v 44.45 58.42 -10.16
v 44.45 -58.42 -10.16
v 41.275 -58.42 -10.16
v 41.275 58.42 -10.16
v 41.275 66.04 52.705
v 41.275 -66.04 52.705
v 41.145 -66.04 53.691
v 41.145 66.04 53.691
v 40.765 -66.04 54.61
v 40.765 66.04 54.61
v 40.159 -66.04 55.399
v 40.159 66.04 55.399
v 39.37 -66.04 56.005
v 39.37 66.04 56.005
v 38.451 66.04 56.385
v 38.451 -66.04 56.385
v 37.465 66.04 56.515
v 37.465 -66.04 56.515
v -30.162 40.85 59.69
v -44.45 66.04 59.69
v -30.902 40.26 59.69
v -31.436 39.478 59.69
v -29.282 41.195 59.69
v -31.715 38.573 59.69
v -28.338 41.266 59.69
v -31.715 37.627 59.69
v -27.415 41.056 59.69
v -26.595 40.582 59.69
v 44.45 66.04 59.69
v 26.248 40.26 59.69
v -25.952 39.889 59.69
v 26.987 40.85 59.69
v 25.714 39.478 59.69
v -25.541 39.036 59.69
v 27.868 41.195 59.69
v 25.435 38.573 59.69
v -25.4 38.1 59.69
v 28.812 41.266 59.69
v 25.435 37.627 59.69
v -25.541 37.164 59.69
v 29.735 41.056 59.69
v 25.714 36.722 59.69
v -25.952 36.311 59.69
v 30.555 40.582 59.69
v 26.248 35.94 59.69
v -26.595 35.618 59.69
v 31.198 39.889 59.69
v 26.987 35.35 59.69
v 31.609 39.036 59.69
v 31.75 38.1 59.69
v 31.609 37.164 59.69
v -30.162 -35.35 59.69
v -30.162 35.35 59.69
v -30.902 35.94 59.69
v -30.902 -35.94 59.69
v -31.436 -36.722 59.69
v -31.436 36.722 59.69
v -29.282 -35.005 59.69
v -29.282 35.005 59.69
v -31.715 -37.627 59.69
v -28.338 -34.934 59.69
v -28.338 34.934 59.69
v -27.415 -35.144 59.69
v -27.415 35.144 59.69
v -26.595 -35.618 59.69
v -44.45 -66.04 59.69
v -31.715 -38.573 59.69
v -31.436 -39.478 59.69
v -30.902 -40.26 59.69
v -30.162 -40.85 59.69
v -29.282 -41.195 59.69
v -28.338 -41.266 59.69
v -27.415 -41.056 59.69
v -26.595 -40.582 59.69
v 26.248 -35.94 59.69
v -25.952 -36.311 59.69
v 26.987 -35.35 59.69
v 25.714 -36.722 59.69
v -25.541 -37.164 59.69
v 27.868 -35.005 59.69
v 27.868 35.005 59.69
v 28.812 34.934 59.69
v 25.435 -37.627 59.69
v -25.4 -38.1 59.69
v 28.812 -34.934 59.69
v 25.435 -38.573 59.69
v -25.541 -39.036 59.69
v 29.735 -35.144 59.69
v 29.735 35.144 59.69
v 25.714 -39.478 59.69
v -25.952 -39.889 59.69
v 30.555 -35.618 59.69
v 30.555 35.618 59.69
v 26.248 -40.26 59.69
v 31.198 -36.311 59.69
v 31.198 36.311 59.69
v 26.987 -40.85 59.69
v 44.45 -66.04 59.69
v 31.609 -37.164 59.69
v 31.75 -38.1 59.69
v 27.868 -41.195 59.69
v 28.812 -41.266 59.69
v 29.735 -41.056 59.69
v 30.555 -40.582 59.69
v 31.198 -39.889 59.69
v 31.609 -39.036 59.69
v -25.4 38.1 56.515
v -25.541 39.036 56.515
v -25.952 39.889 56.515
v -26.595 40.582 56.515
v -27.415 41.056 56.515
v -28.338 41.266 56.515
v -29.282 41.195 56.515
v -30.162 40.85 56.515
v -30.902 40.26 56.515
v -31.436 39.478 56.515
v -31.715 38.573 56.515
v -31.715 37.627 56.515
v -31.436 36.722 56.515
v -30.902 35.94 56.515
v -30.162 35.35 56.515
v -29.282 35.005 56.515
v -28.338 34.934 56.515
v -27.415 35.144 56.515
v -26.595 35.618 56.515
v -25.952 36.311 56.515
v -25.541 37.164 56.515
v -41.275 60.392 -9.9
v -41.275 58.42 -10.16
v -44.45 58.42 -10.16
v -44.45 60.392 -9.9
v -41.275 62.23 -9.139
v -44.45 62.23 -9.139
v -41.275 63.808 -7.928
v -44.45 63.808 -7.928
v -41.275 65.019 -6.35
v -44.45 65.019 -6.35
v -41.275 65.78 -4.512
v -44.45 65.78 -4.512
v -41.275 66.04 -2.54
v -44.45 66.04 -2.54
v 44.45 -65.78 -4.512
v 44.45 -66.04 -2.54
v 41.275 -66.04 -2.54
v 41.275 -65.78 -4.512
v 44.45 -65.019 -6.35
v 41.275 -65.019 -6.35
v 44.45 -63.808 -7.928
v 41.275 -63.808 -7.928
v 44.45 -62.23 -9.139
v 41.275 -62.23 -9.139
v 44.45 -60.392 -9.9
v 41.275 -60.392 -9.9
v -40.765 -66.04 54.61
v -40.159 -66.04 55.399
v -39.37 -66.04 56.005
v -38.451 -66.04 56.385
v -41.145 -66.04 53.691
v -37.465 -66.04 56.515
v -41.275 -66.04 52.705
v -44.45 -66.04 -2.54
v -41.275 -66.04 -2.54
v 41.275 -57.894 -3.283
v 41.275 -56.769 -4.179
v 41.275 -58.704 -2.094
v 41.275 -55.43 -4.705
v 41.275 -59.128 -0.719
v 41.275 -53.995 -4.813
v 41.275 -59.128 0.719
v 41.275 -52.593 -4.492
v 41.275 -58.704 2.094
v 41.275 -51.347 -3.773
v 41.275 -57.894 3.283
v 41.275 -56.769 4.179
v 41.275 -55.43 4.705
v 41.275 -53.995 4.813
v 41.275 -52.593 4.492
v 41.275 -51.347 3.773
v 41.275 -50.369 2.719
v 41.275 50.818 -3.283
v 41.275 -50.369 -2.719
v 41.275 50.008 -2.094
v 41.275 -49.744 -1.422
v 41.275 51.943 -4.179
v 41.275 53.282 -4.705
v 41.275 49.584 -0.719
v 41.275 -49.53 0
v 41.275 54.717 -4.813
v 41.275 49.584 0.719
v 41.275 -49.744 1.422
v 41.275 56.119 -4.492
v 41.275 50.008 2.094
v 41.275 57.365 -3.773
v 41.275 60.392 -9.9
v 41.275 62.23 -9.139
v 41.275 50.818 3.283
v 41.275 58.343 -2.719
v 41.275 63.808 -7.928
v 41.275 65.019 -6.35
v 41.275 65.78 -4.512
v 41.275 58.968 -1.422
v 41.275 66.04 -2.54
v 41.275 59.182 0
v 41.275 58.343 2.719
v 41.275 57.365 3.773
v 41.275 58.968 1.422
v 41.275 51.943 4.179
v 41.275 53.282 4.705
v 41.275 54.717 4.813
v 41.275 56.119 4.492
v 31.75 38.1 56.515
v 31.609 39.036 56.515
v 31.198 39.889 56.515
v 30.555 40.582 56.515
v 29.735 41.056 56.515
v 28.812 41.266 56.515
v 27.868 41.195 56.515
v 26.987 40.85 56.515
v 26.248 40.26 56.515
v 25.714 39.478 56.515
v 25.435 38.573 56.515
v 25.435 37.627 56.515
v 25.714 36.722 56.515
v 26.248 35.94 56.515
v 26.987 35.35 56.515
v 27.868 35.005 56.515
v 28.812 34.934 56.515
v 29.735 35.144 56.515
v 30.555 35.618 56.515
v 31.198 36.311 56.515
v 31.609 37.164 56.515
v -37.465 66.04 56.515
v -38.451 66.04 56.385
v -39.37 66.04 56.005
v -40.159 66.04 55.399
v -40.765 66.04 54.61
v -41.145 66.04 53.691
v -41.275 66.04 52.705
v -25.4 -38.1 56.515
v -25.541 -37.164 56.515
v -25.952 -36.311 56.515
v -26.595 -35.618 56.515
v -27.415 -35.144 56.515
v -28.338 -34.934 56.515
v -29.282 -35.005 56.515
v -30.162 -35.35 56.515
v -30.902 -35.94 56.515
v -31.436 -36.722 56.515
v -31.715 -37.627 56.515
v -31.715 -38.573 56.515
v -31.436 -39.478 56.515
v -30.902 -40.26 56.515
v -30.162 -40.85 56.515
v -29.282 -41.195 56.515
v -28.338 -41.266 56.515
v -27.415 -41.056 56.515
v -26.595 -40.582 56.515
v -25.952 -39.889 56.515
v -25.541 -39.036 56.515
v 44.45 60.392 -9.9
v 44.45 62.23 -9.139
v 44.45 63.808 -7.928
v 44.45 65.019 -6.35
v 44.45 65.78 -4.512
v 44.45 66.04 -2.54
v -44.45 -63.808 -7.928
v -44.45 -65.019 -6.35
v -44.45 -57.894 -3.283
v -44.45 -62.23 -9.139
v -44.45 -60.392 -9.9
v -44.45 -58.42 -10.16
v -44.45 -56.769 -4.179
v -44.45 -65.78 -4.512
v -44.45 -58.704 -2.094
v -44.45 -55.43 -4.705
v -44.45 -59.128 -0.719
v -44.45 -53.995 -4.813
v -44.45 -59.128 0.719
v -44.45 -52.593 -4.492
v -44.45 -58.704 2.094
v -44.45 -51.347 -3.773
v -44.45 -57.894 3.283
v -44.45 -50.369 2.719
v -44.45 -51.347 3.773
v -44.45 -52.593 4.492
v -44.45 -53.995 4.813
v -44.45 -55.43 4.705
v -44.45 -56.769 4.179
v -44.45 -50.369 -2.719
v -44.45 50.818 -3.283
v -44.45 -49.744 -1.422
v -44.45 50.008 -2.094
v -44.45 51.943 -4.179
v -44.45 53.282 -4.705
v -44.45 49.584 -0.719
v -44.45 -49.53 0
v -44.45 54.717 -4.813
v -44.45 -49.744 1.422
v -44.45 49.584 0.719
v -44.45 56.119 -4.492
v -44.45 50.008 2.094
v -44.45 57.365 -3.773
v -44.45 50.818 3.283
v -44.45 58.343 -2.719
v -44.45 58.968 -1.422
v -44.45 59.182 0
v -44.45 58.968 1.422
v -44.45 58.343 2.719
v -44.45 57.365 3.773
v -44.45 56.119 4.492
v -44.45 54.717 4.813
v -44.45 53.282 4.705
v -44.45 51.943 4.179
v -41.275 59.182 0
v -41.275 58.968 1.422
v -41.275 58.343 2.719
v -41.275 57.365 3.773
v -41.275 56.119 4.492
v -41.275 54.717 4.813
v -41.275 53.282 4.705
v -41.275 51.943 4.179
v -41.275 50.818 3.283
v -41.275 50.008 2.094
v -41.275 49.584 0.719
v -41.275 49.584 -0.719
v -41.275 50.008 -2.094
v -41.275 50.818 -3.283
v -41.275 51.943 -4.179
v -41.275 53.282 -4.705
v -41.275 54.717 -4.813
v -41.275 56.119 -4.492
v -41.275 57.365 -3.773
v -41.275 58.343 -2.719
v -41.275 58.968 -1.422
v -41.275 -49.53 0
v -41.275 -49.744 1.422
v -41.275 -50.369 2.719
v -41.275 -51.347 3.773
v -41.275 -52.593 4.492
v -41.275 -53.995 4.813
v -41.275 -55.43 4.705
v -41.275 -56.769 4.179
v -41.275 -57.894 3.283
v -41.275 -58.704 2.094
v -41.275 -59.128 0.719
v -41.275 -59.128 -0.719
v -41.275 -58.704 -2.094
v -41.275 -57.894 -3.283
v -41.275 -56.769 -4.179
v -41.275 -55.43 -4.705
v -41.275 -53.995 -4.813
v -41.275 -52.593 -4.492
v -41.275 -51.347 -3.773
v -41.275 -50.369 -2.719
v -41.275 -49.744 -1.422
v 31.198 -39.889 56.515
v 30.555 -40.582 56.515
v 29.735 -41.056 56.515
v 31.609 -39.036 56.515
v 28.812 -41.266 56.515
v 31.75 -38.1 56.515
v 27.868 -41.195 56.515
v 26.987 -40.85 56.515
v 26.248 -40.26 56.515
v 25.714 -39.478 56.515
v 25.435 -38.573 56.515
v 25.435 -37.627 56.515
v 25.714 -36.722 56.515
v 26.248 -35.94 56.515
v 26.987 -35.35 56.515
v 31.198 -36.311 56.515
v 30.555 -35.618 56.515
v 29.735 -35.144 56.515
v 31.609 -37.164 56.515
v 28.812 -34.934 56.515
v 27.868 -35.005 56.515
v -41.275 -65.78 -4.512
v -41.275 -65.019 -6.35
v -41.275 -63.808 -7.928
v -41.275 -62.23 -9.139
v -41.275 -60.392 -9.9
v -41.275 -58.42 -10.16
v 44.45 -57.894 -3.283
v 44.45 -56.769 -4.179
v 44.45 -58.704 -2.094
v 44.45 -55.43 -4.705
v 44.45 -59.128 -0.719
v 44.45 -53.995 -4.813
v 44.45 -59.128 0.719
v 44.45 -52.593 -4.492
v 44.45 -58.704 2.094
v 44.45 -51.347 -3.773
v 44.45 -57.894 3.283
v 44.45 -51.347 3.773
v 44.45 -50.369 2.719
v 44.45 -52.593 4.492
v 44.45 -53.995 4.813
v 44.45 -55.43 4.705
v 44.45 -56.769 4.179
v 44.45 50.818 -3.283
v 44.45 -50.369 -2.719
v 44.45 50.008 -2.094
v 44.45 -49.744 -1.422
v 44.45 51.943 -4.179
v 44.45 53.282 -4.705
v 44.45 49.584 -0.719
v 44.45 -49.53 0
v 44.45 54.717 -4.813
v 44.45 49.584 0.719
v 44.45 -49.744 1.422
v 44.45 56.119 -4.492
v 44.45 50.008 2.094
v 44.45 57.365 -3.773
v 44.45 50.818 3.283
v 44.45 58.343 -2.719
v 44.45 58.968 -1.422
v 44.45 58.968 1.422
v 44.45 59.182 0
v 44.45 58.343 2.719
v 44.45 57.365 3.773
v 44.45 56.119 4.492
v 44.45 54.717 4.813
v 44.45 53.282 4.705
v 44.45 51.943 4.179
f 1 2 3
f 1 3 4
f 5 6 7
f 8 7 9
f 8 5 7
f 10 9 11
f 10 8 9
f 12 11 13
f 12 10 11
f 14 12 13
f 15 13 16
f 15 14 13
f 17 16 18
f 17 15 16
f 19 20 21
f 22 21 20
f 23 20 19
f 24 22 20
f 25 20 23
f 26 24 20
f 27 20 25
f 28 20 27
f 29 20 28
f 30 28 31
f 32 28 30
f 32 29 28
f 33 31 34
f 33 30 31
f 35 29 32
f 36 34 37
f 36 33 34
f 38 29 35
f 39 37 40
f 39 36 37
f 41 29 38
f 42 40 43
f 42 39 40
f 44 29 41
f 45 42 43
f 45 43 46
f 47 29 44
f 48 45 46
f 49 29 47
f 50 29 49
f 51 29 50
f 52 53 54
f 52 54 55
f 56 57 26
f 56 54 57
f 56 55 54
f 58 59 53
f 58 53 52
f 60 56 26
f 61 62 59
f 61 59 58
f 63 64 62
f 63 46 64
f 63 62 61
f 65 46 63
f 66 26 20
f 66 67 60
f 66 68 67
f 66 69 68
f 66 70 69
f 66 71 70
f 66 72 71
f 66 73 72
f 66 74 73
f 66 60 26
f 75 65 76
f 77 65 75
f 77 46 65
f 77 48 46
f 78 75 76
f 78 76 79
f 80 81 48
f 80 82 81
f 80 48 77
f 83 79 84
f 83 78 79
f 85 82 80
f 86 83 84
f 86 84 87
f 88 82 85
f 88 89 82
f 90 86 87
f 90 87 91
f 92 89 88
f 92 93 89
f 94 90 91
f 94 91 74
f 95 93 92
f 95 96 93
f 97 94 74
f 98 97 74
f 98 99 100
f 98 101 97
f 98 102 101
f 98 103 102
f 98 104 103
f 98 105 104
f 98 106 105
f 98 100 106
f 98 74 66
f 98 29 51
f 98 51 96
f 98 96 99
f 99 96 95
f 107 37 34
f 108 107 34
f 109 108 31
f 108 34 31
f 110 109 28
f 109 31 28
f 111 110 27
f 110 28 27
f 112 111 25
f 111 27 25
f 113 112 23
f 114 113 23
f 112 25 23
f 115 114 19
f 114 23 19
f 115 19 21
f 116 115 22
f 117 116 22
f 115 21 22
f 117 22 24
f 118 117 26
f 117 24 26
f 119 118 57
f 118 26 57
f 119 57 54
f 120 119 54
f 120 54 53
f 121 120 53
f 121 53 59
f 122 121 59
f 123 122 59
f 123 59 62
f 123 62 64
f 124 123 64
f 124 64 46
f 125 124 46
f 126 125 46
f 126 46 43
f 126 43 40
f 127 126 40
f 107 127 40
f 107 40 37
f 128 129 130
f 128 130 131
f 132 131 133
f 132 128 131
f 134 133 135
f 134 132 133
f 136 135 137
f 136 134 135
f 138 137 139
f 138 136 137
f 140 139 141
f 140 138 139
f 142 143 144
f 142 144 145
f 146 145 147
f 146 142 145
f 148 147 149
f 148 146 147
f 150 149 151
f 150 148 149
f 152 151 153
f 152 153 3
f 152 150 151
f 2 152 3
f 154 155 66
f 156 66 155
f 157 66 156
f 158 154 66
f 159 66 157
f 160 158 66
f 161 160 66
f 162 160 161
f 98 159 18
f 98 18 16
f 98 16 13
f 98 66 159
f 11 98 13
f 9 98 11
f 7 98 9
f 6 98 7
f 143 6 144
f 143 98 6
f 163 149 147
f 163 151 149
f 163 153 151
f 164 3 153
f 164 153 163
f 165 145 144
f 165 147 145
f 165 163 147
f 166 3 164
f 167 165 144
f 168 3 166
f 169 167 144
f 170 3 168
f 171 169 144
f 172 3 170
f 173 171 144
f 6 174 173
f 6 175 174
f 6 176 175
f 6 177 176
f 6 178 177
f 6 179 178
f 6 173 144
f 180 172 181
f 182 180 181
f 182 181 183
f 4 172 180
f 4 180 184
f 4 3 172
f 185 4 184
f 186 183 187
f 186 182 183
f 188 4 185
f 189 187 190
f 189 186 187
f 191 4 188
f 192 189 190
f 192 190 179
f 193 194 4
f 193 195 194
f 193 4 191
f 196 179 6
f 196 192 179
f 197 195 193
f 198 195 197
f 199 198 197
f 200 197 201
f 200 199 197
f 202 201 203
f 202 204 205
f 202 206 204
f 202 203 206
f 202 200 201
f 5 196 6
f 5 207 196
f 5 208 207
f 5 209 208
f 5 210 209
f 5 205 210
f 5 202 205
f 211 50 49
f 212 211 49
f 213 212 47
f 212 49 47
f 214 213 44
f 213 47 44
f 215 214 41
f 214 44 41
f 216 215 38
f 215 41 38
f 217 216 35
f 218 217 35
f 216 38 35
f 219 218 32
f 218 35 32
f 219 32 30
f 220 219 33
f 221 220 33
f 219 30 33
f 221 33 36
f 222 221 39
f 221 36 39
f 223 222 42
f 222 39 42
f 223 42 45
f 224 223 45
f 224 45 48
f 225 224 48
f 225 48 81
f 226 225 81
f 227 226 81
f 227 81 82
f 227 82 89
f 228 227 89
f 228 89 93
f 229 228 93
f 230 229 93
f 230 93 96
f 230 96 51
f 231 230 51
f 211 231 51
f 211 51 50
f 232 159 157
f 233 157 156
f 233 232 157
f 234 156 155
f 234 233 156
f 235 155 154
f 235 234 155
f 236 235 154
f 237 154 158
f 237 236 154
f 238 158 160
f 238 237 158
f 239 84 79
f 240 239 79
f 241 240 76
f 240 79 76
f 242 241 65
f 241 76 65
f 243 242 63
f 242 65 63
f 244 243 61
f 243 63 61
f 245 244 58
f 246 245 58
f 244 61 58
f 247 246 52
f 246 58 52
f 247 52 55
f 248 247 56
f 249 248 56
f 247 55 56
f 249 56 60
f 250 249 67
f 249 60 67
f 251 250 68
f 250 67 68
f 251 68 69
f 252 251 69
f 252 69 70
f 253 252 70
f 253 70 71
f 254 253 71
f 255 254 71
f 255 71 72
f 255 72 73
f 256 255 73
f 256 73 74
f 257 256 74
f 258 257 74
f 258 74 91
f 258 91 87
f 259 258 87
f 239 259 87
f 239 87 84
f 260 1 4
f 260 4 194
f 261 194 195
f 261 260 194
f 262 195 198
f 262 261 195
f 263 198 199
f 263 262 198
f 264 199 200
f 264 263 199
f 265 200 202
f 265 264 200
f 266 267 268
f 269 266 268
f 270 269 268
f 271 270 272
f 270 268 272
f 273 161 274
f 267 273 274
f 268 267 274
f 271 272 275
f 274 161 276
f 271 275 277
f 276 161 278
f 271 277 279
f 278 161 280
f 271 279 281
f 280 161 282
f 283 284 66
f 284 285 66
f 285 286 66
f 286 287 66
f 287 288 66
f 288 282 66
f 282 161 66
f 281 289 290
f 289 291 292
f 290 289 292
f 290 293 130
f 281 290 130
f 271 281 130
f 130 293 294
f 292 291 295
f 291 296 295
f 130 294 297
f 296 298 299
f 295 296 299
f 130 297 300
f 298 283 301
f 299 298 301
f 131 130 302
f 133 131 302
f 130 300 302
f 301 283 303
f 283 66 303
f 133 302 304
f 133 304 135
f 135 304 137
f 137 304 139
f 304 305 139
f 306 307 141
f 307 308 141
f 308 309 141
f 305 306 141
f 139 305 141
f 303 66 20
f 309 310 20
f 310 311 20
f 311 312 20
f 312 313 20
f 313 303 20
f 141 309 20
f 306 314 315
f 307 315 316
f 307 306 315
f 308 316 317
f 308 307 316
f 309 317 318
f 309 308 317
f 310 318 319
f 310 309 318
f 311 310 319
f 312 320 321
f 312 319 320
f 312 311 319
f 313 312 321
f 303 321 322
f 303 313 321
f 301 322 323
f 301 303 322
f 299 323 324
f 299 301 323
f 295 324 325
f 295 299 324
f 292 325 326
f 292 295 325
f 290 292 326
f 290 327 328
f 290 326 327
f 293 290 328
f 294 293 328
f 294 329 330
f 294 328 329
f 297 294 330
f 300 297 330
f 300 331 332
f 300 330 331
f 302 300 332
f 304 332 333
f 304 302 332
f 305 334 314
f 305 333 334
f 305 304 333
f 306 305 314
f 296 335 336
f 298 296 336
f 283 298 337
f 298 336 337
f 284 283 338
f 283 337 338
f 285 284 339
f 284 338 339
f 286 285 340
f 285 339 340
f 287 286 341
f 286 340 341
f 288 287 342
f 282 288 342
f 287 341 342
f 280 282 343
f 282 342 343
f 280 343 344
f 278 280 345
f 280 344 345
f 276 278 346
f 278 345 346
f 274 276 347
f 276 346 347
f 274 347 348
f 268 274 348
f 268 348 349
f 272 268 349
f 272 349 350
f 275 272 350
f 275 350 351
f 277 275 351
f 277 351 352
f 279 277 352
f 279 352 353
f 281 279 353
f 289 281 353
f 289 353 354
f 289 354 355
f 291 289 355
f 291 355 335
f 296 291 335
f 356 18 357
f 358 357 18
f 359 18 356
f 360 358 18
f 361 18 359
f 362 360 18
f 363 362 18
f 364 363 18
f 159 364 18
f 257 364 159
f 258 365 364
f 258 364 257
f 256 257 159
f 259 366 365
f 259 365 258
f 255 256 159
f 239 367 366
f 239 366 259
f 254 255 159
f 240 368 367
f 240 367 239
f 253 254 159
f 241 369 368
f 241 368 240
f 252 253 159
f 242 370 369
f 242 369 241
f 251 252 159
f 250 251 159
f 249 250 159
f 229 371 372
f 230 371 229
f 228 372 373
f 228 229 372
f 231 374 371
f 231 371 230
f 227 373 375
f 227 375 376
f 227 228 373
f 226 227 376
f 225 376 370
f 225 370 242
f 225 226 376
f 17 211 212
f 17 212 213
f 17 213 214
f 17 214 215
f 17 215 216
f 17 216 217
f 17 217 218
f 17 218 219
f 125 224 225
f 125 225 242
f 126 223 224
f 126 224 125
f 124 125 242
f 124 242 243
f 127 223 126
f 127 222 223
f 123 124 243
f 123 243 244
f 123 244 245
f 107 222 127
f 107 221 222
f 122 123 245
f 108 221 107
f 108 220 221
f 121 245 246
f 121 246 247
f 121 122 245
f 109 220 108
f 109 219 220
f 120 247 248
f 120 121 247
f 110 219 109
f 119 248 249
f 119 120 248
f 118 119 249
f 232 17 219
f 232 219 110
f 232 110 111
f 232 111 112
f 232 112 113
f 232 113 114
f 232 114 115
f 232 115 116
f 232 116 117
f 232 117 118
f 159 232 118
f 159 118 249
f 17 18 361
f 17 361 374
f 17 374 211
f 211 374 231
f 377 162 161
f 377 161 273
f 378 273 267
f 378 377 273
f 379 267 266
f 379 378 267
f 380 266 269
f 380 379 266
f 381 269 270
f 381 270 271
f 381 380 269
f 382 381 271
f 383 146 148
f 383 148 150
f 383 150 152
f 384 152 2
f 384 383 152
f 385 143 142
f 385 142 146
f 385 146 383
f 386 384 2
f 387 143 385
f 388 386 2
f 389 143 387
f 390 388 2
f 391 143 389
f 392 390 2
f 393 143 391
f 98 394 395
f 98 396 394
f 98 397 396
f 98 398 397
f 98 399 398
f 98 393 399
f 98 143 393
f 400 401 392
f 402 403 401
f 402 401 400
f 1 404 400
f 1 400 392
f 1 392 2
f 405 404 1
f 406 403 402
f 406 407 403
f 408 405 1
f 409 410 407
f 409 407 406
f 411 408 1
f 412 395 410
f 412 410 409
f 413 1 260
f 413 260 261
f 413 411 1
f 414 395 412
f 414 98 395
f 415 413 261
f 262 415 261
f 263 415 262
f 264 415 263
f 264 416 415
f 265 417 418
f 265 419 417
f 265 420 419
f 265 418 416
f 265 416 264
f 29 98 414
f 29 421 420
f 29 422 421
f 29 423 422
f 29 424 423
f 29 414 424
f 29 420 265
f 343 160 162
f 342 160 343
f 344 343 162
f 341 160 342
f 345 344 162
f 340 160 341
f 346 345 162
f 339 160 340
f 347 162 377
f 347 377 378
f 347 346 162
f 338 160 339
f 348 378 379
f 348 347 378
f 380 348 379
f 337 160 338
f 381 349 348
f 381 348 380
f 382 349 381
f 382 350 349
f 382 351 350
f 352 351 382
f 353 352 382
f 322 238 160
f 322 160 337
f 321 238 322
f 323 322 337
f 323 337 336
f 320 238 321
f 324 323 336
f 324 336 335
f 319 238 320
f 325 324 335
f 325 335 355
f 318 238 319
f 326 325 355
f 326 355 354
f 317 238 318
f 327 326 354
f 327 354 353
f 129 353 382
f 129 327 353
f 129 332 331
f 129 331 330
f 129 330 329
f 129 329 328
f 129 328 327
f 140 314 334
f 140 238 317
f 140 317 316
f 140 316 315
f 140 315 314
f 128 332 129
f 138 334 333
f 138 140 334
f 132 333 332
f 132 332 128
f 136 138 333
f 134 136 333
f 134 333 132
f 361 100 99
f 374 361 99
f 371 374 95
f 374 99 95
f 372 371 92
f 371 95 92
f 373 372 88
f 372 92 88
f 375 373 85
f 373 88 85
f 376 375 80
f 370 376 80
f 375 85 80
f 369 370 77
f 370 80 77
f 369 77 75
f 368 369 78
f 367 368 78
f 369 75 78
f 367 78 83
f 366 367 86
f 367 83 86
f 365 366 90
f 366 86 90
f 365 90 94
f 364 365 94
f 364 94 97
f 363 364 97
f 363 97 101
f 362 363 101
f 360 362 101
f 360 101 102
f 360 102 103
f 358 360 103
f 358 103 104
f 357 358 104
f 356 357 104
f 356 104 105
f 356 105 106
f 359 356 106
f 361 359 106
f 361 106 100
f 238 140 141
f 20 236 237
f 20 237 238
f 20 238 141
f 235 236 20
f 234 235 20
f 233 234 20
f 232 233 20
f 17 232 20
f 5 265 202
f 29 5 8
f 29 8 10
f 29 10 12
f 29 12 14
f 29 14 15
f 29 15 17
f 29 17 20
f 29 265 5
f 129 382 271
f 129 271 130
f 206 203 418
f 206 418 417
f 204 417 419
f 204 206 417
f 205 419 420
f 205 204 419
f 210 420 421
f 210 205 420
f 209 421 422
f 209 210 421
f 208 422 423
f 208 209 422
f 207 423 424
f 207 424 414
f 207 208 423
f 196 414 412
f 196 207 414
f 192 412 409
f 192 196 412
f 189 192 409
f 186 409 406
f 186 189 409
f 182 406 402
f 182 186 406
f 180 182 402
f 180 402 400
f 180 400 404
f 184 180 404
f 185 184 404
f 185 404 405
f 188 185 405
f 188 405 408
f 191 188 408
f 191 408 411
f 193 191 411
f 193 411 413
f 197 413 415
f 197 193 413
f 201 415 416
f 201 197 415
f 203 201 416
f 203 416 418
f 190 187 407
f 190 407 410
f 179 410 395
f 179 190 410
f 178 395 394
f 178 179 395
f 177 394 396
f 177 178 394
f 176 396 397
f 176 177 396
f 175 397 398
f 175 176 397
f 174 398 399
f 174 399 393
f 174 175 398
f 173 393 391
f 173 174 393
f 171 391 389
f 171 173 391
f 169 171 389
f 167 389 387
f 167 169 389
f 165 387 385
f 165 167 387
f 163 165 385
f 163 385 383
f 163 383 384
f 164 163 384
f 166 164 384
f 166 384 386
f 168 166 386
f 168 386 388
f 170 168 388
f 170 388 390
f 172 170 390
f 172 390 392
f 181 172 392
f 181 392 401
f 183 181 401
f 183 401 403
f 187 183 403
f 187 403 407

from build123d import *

# Parameters (mm, degrees)
F0_R          = 4.826
F1_DEPTH      = 44.45
F1_DEPTH_BACK = 44.45
F3_DEPTH      = 76.2
F3_DEPTH_BACK = 76.2
F4_R          = 3.175
F5_DEPTH      = 25.4


with BuildPart() as f1:
    # F0 (on Right) → F1 (new body, two sides)
    with BuildSketch(Plane.YZ) as f1_sk:
        with BuildLine():
            Line((-58.42, -10.16), (58.42, -10.16))
            ThreePointArc((58.42, -10.16), (63.808154, -7.928154), (66.04, -2.54))
            Line((66.04, -2.54), (66.04, 59.69))
            Line((66.04, 59.69), (-66.04, 59.69))
            Line((-66.04, 59.69), (-66.04, -2.54))
            ThreePointArc((-66.04, -2.54), (-63.808154, -7.928154), (-58.42, -10.16))
        make_face()
        with Locations((-54.356, 0)):
            Circle(F0_R, mode=Mode.SUBTRACT)
        with Locations((54.356, 0)):
            Circle(F0_R, mode=Mode.SUBTRACT)
    extrude(amount=F1_DEPTH)
    extrude(f1_sk.sketch, amount=-F1_DEPTH_BACK)

    # F2 (on Front) → F3 (cut, two sides)
    with BuildSketch(Plane.XZ) as f3_sk:
        with BuildLine():
            Line((41.275, -10.16), (41.275, -2.54))
            Line((41.275, -2.54), (41.275, 52.705))
            ThreePointArc((41.275, 52.705), (40.159077, 55.399077), (37.465, 56.515))
            Line((37.465, 56.515), (-37.465, 56.515))
            ThreePointArc((-37.465, 56.515), (-40.159077, 55.399077), (-41.275, 52.705))
            Line((-41.275, 52.705), (-41.275, -2.54))
            Line((-41.275, -2.54), (-41.275, -10.16))
            Line((-41.275, -10.16), (41.275, -10.16))
        make_face()
    extrude(amount=F3_DEPTH, mode=Mode.SUBTRACT)
    extrude(f3_sk.sketch, amount=-F3_DEPTH_BACK, mode=Mode.SUBTRACT)

    # F4 (on face) → F5 (cut)
    with BuildSketch(Plane.XY.offset(59.69)):
        with Locations((28.575, -38.1)):
            Circle(F4_R)
        with Locations((-28.575, -38.1)):
            Circle(F4_R)
        with Locations((-28.575, 38.1)):
            Circle(F4_R)
        with Locations((28.575, 38.1)):
            Circle(F4_R)
    extrude(amount=-F5_DEPTH, mode=Mode.SUBTRACT)


solid = f1.part
